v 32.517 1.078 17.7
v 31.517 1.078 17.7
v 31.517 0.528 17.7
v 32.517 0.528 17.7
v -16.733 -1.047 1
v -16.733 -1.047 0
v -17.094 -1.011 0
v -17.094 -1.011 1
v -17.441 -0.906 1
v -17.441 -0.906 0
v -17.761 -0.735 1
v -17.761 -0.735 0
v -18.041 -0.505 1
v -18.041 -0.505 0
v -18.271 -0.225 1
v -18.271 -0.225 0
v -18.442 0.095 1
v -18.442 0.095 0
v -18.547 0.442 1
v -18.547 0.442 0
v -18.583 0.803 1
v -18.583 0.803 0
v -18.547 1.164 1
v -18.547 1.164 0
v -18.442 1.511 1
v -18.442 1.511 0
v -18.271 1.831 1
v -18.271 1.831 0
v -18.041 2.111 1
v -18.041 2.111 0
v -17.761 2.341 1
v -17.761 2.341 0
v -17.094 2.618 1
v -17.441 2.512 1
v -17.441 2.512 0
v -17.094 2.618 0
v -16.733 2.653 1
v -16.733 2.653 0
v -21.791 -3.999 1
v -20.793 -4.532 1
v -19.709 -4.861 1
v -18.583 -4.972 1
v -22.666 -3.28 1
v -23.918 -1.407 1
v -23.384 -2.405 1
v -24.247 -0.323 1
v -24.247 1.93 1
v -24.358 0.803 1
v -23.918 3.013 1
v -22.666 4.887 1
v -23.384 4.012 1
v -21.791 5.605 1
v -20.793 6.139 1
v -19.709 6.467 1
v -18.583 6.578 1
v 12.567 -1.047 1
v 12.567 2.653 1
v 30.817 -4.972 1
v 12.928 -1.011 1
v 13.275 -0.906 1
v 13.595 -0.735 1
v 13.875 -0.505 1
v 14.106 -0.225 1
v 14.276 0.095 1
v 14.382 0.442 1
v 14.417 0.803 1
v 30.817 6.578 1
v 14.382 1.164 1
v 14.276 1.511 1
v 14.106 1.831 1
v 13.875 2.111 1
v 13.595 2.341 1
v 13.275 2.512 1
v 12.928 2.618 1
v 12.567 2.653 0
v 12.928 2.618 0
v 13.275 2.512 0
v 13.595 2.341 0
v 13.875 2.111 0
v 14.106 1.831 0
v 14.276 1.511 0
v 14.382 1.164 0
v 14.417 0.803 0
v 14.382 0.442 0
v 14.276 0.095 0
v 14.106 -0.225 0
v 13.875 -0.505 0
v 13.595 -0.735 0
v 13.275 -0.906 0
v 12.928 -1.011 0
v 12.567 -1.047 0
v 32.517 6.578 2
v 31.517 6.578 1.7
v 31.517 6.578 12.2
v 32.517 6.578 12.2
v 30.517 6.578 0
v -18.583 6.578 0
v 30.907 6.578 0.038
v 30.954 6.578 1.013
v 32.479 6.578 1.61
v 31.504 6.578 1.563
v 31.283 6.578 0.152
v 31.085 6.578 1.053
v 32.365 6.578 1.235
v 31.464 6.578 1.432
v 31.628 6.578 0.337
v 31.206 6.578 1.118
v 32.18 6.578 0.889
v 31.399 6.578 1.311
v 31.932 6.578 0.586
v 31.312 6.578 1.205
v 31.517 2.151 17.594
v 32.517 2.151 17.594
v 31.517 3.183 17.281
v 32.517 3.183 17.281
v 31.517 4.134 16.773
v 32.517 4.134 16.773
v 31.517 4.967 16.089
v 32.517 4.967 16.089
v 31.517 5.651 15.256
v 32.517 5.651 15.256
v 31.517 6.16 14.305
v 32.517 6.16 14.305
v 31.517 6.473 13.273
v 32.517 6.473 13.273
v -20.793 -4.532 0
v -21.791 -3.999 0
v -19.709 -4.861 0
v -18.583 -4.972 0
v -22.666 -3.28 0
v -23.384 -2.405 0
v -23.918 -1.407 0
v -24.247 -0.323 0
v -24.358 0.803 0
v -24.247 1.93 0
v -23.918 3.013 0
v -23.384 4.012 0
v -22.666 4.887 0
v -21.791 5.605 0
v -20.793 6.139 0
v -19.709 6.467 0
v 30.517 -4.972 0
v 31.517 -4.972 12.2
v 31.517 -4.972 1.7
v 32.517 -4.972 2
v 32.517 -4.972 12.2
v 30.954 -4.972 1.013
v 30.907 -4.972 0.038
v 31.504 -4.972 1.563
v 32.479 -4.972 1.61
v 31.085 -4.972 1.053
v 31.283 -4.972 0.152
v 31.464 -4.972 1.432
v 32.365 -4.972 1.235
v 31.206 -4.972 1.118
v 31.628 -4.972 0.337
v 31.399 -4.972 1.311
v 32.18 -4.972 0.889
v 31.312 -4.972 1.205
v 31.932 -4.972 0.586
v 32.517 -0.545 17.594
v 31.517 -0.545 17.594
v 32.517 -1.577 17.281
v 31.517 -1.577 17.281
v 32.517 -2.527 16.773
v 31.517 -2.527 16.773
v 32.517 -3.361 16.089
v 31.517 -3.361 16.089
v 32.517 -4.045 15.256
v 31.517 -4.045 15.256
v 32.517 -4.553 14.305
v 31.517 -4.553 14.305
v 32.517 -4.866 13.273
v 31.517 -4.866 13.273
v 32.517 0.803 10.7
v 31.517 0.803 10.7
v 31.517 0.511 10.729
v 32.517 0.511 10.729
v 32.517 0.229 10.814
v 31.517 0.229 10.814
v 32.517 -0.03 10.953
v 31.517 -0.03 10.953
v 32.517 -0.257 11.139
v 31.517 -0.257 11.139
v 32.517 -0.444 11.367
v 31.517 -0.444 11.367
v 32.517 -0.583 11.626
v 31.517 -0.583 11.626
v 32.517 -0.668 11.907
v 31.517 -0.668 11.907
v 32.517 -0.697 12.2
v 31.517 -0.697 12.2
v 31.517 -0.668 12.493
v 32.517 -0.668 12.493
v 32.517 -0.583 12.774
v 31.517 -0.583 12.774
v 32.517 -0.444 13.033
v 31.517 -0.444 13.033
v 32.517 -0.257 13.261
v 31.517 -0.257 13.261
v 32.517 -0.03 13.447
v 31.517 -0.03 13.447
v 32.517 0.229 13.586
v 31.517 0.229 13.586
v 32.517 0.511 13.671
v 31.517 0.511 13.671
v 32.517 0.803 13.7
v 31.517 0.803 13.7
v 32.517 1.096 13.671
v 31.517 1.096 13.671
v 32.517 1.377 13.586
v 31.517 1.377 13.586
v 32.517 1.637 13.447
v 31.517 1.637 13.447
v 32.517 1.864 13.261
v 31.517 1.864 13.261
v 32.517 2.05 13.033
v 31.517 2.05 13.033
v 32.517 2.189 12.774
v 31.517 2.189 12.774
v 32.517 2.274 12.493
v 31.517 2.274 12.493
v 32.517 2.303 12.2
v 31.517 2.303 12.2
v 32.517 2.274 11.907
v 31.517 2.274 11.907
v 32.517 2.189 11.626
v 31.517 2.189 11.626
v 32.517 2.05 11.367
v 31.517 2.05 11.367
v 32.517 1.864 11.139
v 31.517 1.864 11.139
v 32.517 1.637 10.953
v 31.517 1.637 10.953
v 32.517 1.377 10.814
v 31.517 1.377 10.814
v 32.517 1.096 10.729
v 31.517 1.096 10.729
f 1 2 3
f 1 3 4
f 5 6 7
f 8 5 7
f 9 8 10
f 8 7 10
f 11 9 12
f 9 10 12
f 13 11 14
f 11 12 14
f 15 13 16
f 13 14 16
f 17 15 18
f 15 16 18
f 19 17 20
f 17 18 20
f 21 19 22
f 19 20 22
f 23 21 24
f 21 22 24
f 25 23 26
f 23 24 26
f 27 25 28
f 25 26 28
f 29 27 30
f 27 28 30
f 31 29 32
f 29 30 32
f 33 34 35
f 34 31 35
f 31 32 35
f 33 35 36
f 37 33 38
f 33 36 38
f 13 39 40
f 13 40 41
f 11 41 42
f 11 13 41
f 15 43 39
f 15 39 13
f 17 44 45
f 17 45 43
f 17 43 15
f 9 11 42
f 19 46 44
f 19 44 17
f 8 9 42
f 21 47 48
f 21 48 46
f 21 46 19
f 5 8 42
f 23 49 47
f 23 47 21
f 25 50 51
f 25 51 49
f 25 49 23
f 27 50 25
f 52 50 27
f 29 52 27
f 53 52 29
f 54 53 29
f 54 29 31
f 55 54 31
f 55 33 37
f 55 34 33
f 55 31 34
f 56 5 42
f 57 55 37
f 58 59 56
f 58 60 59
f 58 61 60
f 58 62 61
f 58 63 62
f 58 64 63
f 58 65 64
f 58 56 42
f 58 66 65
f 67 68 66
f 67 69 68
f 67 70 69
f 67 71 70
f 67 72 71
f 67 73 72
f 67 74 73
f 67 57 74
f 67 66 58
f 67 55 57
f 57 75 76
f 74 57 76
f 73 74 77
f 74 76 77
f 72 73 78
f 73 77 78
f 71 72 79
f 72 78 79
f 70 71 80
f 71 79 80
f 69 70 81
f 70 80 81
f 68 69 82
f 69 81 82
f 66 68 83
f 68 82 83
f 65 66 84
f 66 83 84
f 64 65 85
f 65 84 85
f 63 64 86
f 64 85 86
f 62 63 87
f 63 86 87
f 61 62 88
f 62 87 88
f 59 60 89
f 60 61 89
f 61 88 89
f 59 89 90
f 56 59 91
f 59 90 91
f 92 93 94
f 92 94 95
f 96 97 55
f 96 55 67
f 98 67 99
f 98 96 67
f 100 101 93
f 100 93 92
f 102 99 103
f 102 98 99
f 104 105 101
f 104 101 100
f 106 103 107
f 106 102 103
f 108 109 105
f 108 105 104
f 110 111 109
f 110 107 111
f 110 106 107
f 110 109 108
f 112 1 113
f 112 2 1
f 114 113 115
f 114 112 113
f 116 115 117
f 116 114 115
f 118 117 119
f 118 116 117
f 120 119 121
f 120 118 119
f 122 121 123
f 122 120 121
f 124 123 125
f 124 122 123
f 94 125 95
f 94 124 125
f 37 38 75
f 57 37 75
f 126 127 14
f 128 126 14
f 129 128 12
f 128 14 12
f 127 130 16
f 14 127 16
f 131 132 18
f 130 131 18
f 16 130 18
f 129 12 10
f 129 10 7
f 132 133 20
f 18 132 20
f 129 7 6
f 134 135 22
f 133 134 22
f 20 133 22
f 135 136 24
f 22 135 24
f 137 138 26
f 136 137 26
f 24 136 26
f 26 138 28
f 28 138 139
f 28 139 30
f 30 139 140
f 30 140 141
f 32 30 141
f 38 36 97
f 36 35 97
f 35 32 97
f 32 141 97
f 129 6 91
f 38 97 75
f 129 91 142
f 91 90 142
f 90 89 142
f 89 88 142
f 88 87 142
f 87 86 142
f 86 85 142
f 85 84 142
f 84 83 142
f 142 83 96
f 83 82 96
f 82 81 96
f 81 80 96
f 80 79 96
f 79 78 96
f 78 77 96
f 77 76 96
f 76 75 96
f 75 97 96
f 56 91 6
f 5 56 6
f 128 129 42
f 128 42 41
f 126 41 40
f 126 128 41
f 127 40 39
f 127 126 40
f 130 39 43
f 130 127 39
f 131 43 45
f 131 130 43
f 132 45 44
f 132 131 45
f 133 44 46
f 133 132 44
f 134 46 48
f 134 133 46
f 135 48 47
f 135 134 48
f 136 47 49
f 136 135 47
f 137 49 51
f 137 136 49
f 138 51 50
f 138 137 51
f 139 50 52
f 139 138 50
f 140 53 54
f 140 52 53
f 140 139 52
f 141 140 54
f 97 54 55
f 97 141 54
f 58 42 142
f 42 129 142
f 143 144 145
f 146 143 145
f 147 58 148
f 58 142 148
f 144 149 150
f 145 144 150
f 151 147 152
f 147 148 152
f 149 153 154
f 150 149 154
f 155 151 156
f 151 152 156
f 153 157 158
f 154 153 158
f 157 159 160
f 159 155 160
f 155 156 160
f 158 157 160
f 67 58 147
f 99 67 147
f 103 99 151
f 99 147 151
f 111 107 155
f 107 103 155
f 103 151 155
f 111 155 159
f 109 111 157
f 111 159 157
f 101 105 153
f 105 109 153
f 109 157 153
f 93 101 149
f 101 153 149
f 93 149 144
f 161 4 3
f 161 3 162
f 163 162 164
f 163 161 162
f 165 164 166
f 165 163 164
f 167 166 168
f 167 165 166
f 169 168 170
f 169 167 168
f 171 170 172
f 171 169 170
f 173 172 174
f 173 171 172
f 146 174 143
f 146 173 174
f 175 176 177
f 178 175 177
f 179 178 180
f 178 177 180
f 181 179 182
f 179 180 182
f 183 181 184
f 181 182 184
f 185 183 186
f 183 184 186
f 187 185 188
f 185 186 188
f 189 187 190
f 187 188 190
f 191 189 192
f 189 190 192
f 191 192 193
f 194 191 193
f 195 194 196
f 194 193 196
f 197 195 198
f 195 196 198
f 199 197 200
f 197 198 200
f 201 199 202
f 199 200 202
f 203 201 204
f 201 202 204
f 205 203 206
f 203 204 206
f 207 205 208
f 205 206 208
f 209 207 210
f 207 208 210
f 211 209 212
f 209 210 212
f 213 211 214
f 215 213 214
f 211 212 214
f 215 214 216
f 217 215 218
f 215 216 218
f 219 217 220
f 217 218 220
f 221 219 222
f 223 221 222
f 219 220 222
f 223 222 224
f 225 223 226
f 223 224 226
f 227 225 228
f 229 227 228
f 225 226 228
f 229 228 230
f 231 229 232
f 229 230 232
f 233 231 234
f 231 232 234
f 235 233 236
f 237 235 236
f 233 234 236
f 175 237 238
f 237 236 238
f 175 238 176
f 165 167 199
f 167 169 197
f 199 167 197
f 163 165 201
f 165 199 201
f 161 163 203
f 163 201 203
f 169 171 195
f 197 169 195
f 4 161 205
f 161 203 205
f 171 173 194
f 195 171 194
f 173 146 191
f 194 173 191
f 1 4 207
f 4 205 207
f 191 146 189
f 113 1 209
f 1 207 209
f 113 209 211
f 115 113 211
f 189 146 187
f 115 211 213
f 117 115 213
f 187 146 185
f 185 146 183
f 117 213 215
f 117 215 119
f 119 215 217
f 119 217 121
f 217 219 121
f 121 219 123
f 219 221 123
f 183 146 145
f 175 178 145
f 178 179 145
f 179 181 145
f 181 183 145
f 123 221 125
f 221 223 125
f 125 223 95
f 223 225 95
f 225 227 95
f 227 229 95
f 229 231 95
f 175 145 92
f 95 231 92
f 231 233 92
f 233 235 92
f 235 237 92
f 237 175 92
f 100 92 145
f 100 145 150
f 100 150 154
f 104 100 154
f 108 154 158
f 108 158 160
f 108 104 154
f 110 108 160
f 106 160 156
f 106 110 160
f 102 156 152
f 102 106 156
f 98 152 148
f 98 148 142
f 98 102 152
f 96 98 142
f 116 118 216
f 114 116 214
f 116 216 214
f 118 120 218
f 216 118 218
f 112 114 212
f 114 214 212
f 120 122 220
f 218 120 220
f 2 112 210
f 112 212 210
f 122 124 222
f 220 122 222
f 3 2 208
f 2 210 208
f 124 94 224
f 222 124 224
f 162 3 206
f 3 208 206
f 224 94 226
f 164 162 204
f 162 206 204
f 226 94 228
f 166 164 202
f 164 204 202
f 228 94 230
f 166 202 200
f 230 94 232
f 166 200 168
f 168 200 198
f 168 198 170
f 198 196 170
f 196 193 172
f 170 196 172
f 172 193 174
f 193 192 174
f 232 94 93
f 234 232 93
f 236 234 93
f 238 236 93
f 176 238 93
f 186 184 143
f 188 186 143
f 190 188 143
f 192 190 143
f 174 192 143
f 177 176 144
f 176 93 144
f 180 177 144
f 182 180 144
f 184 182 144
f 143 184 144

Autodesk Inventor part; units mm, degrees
ref_plane "YZ Plane" through (0, 0, 0) normal (1, 0, 0) x (0, 1, 0)
ref_plane "XZ Plane" through (0, 0, 0) normal (0, 1, 0) x (-1, 0, 0)
ref_plane "XY Plane" through (0, 0, 0) normal (0, 0, 1) x (1, 0, 0)
sketch "Esboço1" plane through (0, 0, 0) normal (0, 0, 1) x (1, 0, 0)
  line L0 (-18.5827, 6.5782) -> (32.5173, 6.5782)
  line L1 (-18.5827, -4.9718) -> (32.5173, -4.9718)
  line L2 (32.5173, -4.9718) -> (32.5173, 6.5782)
  arc A0 (-18.5827, 6.5782) -> (-18.5827, -4.9718) centre (-18.5827, 0.8032) ccw
  line L3 (-16.7327, 2.6532) -> (12.5673, 2.6532)
  line L4 (12.5673, -1.0468) -> (-16.7327, -1.0468)
  arc A1 (-16.7327, 2.6532) -> (-16.7327, -1.0468) centre (-16.7327, 0.8032) ccw
  arc A2 (12.5673, -1.0468) -> (12.5673, 2.6532) centre (12.5673, 0.8032) ccw
  point P0 (0, 0)
  point P1 (-2.0827, 0.8032)
  point P2 (-2.0827, 0.8032)
extrude "Extrusão1" add sketch "Esboço1" along normal blind 1
sketch "Esboço2" plane through (0, 0, 1) normal (0, 0, 1) x (1, 0, 0)
  line L0 (32.5173, 6.5782) -> (31.5173, 6.5782)
  line L1 (31.5173, 6.5782) -> (31.5173, -4.9718)
  line L2 (31.5173, -4.9718) -> (32.5173, -4.9718)
  line L3 (32.5173, -4.9718) -> (32.5173, 6.5782)
  point P0 (0, 0)
  dimension "d8" = 1
extrude "Extrusão2" add sketch "Esboço2" along normal blind 16.7
fillet "Arredondamento1" radius 5.5 1 edges at (32.0173, 6.5782, 17.7)
fillet "Arredondamento2" radius 5.5 1 edges at (32.0173, -4.9718, 17.7)
sketch "Esboço3" plane through (32.5173, -4.9718, 0) normal (1, 0, 0) x (0, 0, -1)
  circle A0 centre (-12.2, 5.775) radius 1.5
  line L0 (0, 11.55) -> (0, 0) projected
  point P0 (0, 4.9718)
  dimension "d25" = 12.2
hole "Furo1" at (32.5173, 0.8032, 12.2) direction (-1, 0, 0) diameter 3 end through all
fillet "Fillet3" radius 0.7 1 edges at (31.5173, 0.8032, 1)
fillet "Fillet4" radius 2 1 edges at (32.5173, 0.8032, 0)
equation "\"BendRadius\" = Thickness"
equation "\"BendReliefWidth\" = Thickness"
equation "\"BendReliefDepth\" = 0.5 * Thickness"
equation "\"CornerReliefSize\" = 4 * Thickness"
equation "\"MinimumRemnant\" = 2 * Thickness"
equation "\"TransitionRadius\" = BendRadius"
equation "\"JacobiRadiusSize\" = Thickness"
equation "\"GapSize\" = Thickness"
equation "\"Thickness\" = 0.5"
properties part number "apoio de escudo2"
